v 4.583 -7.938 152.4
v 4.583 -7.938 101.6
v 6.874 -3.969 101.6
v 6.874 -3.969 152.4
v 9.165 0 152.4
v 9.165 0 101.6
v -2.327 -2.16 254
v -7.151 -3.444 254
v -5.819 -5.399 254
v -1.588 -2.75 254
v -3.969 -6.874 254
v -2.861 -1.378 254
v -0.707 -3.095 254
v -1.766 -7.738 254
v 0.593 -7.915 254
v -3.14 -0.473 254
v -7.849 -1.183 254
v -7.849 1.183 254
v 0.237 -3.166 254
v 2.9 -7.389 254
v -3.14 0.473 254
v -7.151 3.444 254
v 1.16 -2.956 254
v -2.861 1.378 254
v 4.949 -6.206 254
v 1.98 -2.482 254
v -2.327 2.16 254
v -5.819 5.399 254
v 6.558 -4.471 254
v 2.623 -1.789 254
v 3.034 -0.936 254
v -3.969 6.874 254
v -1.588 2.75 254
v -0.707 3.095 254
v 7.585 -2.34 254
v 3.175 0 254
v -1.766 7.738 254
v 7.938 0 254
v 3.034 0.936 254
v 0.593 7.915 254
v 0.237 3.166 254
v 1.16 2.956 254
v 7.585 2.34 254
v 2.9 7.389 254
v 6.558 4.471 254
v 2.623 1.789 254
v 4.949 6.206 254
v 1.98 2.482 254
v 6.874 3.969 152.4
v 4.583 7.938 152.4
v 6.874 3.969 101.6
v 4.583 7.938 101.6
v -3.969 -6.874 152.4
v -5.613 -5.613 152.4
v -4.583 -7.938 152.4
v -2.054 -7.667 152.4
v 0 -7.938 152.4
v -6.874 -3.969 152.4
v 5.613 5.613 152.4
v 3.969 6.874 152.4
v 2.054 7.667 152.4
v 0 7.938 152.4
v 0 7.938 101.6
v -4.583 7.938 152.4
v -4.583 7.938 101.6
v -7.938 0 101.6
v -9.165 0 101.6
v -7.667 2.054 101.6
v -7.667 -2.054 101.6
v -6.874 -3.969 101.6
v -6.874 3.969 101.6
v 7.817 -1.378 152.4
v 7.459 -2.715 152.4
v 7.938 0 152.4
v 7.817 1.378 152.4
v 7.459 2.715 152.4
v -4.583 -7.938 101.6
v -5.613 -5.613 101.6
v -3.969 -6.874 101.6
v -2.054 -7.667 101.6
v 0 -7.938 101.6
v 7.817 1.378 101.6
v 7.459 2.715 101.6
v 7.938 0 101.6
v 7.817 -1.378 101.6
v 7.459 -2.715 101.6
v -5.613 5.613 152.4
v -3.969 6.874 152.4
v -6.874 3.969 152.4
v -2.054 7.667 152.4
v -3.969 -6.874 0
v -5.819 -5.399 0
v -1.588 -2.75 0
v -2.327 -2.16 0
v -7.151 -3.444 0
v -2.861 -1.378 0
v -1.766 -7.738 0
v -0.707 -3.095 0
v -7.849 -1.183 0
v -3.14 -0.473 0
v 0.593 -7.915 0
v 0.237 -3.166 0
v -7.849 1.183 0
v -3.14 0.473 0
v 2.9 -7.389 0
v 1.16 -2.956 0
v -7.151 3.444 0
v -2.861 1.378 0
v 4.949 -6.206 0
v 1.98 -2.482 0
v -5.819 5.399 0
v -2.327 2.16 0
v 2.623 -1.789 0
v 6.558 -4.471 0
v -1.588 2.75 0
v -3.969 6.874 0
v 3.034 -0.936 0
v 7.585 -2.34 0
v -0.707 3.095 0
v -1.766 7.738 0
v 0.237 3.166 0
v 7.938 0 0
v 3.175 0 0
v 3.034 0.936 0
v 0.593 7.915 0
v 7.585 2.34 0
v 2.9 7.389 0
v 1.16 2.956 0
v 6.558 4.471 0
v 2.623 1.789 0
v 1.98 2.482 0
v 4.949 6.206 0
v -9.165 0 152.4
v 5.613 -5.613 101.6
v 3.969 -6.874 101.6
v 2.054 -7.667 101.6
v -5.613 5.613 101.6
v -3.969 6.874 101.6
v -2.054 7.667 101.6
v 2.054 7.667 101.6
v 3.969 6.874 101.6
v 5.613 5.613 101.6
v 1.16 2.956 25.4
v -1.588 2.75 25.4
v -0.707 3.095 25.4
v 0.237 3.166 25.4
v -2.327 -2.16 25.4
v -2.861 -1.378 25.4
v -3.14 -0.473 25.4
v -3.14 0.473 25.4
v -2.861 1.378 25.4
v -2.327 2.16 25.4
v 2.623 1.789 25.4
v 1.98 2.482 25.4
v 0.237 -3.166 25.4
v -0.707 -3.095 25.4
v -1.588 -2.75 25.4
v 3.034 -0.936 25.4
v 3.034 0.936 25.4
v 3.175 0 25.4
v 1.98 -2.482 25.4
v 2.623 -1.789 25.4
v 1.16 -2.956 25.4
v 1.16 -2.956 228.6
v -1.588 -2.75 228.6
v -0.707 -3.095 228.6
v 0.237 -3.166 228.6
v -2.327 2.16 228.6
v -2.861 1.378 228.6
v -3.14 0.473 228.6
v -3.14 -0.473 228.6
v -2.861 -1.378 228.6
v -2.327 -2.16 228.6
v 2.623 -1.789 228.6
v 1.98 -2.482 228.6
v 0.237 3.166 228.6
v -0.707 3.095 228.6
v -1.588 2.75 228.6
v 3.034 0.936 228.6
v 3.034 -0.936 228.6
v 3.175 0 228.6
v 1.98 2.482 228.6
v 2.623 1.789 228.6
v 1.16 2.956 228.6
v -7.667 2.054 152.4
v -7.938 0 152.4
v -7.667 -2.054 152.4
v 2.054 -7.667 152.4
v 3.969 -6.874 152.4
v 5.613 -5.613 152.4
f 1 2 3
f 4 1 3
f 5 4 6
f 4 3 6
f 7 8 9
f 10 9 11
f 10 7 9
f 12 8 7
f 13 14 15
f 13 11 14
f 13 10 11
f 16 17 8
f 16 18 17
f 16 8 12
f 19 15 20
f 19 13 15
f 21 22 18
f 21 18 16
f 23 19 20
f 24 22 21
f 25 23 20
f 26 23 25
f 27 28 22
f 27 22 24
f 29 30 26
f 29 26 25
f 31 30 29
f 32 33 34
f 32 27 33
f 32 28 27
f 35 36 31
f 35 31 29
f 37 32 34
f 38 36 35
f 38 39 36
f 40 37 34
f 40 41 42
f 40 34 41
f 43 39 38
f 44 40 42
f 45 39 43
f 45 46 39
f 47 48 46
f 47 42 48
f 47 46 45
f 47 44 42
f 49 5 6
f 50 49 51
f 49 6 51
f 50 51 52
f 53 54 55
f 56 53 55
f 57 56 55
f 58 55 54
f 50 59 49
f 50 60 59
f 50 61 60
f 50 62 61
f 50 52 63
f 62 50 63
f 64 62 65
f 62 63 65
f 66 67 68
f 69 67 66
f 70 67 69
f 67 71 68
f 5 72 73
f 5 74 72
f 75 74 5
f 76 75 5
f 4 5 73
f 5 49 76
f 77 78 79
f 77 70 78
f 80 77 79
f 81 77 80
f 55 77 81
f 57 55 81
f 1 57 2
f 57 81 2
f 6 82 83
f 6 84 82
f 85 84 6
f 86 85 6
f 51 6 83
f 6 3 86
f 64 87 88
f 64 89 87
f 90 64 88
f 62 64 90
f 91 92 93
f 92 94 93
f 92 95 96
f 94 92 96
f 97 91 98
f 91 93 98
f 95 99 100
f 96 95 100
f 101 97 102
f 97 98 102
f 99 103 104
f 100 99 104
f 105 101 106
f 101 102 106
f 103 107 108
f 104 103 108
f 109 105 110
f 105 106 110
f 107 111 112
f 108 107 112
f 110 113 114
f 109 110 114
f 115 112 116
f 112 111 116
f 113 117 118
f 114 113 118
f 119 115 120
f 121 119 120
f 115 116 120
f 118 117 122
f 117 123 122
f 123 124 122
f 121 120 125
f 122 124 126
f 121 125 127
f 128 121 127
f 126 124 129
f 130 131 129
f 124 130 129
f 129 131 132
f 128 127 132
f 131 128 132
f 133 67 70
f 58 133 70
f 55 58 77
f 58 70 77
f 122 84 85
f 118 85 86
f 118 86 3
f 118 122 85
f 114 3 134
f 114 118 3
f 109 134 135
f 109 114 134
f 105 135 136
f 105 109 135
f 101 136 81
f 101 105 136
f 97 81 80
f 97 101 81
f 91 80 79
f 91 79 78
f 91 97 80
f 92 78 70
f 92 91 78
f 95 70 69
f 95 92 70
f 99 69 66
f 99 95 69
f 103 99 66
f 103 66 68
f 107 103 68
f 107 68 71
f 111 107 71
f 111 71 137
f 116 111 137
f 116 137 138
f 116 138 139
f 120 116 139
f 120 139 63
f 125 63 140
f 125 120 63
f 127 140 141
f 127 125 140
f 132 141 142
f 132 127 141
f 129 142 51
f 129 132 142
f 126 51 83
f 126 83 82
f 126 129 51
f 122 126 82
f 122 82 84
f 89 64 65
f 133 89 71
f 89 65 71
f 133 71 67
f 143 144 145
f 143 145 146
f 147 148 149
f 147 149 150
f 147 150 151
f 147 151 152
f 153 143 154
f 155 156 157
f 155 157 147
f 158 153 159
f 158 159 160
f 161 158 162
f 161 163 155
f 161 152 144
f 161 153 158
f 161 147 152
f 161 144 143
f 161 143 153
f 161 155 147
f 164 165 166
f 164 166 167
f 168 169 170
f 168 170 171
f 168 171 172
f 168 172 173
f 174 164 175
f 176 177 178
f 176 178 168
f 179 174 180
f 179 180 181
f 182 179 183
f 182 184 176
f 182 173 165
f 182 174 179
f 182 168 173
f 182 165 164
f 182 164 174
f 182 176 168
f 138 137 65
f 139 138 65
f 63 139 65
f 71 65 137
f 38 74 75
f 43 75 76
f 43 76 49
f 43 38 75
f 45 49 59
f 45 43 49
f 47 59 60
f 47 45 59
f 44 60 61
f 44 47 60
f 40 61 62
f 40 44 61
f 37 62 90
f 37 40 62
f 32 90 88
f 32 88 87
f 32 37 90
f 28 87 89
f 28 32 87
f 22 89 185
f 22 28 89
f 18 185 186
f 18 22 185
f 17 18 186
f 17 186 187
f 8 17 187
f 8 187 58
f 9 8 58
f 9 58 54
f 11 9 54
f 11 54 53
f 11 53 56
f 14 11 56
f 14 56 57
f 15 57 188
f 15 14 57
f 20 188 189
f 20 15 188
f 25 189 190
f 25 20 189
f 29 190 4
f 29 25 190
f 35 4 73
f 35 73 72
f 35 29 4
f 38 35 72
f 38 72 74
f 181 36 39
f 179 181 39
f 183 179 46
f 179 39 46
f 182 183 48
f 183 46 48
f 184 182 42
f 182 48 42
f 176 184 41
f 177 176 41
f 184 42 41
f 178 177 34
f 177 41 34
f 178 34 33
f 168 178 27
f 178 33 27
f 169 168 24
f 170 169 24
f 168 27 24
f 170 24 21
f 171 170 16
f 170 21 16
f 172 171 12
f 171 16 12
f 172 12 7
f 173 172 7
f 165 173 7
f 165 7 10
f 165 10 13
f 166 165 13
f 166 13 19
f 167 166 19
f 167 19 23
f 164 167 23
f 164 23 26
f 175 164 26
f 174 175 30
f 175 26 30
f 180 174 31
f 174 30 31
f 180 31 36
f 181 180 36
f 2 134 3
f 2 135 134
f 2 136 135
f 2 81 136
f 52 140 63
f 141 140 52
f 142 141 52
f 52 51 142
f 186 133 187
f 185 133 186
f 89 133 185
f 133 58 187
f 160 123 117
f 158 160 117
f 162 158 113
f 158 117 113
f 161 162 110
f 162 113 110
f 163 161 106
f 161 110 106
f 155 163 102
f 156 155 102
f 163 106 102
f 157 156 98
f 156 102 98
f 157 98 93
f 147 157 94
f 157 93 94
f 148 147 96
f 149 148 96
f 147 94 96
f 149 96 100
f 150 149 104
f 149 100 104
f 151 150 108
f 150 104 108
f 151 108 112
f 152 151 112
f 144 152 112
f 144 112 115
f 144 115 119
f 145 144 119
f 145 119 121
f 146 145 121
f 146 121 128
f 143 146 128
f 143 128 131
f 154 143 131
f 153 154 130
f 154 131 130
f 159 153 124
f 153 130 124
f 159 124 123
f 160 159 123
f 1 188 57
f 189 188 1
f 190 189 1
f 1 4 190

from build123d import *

# Parameters (mm, degrees)
F1_DEPTH = 254
F2_R     = 9.165436
F2_R_2   = 7.9375
F3_DEPTH = 101.6
F4_R     = 9.165436
F4_R_2   = 7.9375
F5_DEPTH = 101.6
F6_R     = 3.175
F7_DEPTH = 25.4
F8_R     = 3.175
F9_DEPTH = 25.4


with BuildPart() as f1:
    # F0 (on Top) → F1 (new body)
    with BuildSketch(Plane.XY):
        Polygon((-4.582718, 7.9375), (-9.165436, 0), (-4.582718, -7.9375), (4.582718, -7.9375), (9.165436, 0), (4.582718, 7.9375), align=None)
    extrude(amount=F1_DEPTH)

    # F2 (on face) → F3 (cut)
    with BuildSketch(Plane.XY.offset(254)):
        Circle(F2_R)
        Circle(F2_R_2, mode=Mode.SUBTRACT)
    extrude(amount=-F3_DEPTH, mode=Mode.SUBTRACT)

    # F4 (on face) → F5 (cut)
    with BuildSketch(Plane(origin=(0, 0, 0), x_dir=(1, 0, 0), z_dir=(0, 0, -1))):
        Circle(F4_R)
        Circle(F4_R_2, mode=Mode.SUBTRACT)
    extrude(amount=-F5_DEPTH, mode=Mode.SUBTRACT)

    # F6 (on face) → F7 (cut)
    with BuildSketch(Plane(origin=(0, 0, 0), x_dir=(1, 0, 0), z_dir=(0, 0, -1))):
        Circle(F6_R)
    extrude(amount=-F7_DEPTH, mode=Mode.SUBTRACT)

    # F8 (on face) → F9 (cut)
    with BuildSketch(Plane.XY.offset(254)):
        Circle(F8_R)
    extrude(amount=-F9_DEPTH, mode=Mode.SUBTRACT)


solid = f1.part
